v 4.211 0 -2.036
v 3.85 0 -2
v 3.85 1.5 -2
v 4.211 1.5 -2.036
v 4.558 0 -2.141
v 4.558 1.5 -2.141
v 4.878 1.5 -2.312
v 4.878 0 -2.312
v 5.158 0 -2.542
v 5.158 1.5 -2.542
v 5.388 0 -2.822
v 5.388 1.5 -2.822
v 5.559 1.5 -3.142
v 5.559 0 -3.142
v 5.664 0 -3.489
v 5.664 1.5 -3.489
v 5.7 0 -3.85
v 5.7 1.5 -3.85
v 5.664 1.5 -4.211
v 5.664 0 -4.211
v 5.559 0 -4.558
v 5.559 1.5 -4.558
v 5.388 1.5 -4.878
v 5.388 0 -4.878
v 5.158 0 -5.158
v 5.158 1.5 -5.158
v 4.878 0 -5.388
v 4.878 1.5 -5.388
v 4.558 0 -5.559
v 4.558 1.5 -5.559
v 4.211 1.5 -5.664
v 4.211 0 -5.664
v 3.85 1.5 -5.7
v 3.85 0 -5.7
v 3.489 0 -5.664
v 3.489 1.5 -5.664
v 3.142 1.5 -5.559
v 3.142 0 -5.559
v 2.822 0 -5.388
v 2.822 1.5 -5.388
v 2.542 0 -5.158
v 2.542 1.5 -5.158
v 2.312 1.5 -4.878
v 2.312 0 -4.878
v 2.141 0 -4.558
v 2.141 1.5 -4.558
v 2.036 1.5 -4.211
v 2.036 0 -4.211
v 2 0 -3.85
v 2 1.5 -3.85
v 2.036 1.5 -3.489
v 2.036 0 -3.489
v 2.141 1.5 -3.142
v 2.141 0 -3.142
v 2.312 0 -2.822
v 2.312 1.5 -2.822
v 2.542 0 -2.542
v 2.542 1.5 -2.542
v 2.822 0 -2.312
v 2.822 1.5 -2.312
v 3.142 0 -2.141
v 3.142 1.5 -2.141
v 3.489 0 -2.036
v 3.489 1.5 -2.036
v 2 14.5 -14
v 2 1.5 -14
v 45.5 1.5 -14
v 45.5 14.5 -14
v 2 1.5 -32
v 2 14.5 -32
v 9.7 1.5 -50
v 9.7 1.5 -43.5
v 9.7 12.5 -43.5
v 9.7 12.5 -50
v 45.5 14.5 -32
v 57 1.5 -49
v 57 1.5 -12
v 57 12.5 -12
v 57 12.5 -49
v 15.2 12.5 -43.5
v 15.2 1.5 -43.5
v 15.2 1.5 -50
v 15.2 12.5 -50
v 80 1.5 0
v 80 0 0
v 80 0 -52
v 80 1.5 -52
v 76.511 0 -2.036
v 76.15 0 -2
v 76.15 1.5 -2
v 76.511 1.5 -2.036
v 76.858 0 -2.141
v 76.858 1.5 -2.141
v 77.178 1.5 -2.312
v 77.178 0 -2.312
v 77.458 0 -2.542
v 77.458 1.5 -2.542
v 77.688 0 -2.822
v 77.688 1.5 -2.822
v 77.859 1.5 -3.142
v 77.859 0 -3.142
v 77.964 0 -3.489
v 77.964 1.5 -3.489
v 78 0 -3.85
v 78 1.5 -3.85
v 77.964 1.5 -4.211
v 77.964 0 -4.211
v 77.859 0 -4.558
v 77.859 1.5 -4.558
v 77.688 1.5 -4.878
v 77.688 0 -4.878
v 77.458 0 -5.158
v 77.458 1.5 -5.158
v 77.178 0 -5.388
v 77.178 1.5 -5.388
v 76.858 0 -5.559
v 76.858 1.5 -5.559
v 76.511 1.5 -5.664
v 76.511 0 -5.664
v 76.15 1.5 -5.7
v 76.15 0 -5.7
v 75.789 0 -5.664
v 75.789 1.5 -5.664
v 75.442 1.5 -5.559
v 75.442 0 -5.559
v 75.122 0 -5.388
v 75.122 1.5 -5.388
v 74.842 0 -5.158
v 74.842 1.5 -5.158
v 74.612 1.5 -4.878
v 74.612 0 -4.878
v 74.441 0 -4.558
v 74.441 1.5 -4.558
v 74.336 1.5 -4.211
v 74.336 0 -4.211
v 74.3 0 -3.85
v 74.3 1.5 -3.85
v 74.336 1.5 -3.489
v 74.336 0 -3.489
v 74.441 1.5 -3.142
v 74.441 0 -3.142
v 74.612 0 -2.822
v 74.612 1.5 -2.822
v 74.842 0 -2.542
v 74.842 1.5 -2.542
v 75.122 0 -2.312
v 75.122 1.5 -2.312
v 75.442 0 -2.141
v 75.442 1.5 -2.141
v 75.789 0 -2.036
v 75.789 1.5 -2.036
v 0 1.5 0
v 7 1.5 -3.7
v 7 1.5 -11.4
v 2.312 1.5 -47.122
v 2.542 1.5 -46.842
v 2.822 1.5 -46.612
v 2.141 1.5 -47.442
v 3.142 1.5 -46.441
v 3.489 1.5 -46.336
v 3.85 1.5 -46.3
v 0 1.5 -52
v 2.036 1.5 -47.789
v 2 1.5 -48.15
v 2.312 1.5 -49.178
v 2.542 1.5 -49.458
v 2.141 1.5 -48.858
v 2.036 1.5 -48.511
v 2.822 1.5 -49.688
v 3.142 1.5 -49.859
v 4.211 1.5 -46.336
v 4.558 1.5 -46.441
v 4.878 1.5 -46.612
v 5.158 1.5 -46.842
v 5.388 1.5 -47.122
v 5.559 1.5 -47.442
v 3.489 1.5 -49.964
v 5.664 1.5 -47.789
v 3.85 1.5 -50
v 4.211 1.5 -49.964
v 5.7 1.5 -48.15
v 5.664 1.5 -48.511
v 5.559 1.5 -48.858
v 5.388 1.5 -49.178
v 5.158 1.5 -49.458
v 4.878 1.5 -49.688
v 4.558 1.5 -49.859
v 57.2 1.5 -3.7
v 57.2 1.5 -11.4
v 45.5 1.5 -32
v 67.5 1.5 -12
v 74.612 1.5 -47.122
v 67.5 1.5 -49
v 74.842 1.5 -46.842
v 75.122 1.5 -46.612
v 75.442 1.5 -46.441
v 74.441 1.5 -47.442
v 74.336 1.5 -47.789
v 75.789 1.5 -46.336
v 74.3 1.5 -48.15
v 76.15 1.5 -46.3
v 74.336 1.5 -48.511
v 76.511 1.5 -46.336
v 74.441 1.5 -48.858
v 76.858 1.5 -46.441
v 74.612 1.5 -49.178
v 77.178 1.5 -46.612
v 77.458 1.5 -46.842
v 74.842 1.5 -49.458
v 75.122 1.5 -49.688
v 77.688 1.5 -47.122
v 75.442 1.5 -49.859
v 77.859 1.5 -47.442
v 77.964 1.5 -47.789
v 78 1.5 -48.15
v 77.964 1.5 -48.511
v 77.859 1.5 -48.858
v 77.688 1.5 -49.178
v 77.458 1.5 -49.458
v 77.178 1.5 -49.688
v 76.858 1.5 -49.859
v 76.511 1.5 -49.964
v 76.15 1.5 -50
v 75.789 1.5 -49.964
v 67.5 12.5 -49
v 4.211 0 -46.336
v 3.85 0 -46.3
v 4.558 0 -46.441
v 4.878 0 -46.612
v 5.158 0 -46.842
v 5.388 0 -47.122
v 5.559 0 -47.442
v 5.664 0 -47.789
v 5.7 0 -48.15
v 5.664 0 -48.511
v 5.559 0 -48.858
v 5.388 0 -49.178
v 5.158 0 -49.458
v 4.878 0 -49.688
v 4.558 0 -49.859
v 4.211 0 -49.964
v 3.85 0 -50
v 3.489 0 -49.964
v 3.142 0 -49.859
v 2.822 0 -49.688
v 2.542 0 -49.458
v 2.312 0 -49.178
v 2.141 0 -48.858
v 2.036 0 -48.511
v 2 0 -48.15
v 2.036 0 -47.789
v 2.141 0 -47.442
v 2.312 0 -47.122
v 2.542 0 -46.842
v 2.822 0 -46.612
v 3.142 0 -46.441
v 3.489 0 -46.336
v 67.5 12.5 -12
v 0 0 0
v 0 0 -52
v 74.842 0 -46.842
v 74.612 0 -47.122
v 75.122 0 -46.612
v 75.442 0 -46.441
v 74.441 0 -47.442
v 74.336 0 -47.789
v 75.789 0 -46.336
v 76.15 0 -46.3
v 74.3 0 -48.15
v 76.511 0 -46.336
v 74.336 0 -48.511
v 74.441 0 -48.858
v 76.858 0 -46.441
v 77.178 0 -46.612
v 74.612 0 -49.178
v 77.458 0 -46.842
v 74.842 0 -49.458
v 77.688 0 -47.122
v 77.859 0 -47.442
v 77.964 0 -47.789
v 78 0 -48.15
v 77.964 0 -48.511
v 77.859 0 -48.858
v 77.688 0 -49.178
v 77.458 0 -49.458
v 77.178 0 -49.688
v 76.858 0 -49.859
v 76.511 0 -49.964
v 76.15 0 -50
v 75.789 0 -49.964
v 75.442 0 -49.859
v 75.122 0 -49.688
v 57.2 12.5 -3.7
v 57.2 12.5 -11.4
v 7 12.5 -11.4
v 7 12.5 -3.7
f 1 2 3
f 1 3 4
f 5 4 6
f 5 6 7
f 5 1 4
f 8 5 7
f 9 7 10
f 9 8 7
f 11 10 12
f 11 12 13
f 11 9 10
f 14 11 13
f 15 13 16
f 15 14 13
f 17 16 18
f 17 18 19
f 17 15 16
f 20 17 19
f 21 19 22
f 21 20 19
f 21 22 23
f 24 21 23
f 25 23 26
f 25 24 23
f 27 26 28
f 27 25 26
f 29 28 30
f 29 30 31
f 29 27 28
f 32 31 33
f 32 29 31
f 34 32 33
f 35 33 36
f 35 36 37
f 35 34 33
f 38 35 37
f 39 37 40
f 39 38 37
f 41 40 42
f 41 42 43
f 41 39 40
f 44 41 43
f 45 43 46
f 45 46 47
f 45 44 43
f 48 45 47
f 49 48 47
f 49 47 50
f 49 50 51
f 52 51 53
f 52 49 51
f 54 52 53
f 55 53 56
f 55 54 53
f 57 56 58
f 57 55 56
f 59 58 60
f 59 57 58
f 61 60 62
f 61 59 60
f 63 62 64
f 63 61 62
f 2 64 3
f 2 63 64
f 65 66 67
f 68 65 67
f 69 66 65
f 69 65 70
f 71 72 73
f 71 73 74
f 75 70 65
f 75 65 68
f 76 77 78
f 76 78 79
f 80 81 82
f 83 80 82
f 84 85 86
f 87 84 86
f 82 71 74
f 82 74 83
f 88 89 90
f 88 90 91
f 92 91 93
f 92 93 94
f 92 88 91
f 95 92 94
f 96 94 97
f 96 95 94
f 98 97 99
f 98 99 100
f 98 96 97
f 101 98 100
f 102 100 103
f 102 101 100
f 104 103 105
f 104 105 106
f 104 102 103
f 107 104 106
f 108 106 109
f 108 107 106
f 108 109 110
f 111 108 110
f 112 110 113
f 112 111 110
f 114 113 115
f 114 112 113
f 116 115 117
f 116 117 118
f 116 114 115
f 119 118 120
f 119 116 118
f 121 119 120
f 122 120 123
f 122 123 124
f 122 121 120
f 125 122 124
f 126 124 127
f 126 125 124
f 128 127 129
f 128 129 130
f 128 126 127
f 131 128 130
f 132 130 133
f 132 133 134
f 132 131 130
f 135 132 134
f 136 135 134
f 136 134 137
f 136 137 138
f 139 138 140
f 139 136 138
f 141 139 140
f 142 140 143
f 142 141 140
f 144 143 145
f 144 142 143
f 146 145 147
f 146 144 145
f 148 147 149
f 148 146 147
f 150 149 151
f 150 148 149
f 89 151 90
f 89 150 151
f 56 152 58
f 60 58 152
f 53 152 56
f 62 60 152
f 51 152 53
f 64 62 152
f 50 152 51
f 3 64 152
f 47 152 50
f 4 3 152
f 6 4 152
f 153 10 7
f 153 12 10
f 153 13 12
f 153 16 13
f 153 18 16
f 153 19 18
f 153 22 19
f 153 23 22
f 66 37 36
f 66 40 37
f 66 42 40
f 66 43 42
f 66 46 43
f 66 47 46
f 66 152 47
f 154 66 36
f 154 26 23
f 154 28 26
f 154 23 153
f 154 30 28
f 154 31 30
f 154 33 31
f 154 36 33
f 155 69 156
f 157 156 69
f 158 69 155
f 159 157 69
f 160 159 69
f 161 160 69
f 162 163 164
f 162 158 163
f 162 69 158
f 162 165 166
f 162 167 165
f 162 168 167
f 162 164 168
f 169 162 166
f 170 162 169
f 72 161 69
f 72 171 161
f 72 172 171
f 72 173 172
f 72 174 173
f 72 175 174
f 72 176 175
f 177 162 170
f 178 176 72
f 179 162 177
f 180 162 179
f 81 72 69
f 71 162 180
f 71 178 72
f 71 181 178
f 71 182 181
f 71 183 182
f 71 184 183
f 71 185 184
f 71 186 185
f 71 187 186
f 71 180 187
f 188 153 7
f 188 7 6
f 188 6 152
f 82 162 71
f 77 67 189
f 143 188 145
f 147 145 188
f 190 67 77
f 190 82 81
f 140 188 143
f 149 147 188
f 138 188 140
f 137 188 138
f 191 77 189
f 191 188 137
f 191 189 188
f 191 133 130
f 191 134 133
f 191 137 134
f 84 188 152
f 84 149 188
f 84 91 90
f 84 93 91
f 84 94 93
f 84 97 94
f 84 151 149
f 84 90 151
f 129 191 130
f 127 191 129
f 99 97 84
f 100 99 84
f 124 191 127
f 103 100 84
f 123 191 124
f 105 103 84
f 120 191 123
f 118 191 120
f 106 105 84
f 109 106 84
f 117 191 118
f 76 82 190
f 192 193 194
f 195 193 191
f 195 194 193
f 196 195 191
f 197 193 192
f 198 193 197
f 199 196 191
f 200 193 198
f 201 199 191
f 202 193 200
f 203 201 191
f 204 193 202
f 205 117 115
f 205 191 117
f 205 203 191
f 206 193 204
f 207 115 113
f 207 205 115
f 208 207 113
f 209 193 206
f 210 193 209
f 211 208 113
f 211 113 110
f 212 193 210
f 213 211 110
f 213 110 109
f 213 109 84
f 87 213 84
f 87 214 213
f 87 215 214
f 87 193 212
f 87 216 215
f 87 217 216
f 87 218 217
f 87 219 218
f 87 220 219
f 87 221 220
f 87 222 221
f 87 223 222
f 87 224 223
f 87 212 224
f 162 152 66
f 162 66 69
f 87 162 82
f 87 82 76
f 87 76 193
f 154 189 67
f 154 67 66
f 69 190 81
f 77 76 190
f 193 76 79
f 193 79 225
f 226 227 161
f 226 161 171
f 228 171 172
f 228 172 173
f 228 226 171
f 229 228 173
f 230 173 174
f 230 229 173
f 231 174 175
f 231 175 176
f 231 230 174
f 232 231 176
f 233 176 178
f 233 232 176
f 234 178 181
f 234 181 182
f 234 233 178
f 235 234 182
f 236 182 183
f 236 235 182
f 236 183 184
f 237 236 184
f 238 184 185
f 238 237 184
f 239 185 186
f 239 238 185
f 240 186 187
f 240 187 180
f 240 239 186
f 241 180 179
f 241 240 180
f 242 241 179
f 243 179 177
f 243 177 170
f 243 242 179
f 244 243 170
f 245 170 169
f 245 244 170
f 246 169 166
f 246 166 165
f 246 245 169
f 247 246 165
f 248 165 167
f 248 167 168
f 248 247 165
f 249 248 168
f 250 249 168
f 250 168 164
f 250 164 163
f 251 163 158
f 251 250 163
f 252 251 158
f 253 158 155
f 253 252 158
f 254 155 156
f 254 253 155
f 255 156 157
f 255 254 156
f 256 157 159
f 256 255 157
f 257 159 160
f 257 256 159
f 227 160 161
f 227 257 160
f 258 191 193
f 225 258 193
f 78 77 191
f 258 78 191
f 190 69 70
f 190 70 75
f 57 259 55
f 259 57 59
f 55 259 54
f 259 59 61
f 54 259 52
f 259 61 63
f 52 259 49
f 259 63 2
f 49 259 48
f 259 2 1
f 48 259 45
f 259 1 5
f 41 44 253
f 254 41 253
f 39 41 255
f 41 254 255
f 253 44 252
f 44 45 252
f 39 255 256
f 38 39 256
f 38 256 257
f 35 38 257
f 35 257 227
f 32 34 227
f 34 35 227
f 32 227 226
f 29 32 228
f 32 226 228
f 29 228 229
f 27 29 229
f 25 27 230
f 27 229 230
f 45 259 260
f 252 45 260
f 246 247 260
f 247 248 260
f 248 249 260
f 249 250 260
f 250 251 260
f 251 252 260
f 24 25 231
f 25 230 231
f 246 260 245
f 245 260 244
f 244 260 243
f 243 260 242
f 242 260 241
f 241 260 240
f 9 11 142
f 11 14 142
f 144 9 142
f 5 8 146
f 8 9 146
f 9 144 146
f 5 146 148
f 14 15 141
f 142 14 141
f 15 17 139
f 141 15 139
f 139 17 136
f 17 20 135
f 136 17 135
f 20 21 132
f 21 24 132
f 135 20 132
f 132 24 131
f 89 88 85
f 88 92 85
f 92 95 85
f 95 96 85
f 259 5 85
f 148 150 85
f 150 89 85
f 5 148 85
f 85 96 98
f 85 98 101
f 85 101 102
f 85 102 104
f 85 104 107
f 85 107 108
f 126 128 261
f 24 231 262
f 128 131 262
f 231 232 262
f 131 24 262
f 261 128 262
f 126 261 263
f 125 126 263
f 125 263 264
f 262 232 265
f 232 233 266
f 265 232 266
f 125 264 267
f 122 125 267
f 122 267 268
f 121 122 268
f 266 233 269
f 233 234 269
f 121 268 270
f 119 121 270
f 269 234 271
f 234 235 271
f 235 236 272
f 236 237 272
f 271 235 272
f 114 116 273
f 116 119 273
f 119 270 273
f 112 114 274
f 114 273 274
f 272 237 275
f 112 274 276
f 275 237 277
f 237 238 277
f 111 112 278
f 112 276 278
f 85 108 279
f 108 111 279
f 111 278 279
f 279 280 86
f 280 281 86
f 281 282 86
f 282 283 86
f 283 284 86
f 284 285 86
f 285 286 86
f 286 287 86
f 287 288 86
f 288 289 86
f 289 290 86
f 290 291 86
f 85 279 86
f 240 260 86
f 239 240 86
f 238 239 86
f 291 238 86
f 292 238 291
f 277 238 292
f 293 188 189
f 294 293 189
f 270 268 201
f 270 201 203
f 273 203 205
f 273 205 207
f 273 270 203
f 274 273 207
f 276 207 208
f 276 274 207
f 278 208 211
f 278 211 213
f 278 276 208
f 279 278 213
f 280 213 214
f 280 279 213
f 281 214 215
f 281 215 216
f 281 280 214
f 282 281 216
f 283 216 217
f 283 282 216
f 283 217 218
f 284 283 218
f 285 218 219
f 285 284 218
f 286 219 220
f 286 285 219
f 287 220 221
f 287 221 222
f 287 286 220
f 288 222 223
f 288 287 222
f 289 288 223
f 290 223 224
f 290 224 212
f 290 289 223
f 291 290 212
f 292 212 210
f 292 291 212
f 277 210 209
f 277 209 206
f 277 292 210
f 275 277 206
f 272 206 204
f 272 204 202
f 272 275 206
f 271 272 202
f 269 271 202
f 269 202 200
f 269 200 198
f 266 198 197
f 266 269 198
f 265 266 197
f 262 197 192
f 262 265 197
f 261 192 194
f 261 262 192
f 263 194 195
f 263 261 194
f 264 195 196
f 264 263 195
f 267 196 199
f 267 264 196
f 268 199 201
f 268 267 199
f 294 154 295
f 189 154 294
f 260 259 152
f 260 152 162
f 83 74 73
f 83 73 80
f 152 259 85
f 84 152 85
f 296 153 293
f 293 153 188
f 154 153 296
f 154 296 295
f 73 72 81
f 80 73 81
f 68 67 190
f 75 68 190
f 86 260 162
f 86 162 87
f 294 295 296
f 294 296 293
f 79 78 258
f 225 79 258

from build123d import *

# Parameters (mm, degrees)
SKETCH1_W           = 80
SKETCH1_H           = 52
SKETCH1_R           = 1.85
BOSS_EXTRUDE1_DEPTH = 1.5
SKETCH2_W           = 43.5
SKETCH2_H           = 18
BOSS_EXTRUDE2_DEPTH = 13
SKETCH3_W           = 10.5
SKETCH3_H           = 37
SKETCH3_W_2         = 50.2
SKETCH3_H_2         = 7.7
SKETCH3_W_3         = 5.5
SKETCH3_H_3         = 6.5
BOSS_EXTRUDE3_DEPTH = 11


with BuildPart() as part:
    # Sketch1 → Boss-Extrude1 (new body)
    with BuildSketch(Plane(origin=(0, 0, 0), x_dir=(1, 0, 0), z_dir=(0, 1, 0))):
        with Locations((40, 26)):
            Rectangle(SKETCH1_W, SKETCH1_H)
        with Locations(Location((3.85, 48.15, 0), (0, 0, 270))):
            Circle(SKETCH1_R, mode=Mode.SUBTRACT)
        with Locations(Location((3.85, 3.85, 0), (0, 0, 270))):
            Circle(SKETCH1_R, mode=Mode.SUBTRACT)
        with Locations(Location((76.15, 48.15, 0), (0, 0, 270))):
            Circle(SKETCH1_R, mode=Mode.SUBTRACT)
        with Locations(Location((76.15, 3.85, 0), (0, 0, 270))):
            Circle(SKETCH1_R, mode=Mode.SUBTRACT)
    extrude(amount=BOSS_EXTRUDE1_DEPTH)

    # Sketch2 → Boss-Extrude2 (add)
    with BuildSketch(Plane(origin=(0, 1.5, 0), x_dir=(1, 0, 0), z_dir=(0, 1, 0))):
        with Locations((23.75, 23)):
            Rectangle(SKETCH2_W, SKETCH2_H)
    extrude(amount=BOSS_EXTRUDE2_DEPTH)

    # Sketch3 → Boss-Extrude3 (add)
    with BuildSketch(Plane(origin=(0, 1.5, 0), x_dir=(1, 0, 0), z_dir=(0, 1, 0))):
        with Locations((62.25, 30.5)):
            Rectangle(SKETCH3_W, SKETCH3_H)
        with Locations((32.1, 7.55)):
            Rectangle(SKETCH3_W_2, SKETCH3_H_2)
        with Locations((12.45, 46.75)):
            Rectangle(SKETCH3_W_3, SKETCH3_H_3)
    extrude(amount=BOSS_EXTRUDE3_DEPTH)


solid = part.part
